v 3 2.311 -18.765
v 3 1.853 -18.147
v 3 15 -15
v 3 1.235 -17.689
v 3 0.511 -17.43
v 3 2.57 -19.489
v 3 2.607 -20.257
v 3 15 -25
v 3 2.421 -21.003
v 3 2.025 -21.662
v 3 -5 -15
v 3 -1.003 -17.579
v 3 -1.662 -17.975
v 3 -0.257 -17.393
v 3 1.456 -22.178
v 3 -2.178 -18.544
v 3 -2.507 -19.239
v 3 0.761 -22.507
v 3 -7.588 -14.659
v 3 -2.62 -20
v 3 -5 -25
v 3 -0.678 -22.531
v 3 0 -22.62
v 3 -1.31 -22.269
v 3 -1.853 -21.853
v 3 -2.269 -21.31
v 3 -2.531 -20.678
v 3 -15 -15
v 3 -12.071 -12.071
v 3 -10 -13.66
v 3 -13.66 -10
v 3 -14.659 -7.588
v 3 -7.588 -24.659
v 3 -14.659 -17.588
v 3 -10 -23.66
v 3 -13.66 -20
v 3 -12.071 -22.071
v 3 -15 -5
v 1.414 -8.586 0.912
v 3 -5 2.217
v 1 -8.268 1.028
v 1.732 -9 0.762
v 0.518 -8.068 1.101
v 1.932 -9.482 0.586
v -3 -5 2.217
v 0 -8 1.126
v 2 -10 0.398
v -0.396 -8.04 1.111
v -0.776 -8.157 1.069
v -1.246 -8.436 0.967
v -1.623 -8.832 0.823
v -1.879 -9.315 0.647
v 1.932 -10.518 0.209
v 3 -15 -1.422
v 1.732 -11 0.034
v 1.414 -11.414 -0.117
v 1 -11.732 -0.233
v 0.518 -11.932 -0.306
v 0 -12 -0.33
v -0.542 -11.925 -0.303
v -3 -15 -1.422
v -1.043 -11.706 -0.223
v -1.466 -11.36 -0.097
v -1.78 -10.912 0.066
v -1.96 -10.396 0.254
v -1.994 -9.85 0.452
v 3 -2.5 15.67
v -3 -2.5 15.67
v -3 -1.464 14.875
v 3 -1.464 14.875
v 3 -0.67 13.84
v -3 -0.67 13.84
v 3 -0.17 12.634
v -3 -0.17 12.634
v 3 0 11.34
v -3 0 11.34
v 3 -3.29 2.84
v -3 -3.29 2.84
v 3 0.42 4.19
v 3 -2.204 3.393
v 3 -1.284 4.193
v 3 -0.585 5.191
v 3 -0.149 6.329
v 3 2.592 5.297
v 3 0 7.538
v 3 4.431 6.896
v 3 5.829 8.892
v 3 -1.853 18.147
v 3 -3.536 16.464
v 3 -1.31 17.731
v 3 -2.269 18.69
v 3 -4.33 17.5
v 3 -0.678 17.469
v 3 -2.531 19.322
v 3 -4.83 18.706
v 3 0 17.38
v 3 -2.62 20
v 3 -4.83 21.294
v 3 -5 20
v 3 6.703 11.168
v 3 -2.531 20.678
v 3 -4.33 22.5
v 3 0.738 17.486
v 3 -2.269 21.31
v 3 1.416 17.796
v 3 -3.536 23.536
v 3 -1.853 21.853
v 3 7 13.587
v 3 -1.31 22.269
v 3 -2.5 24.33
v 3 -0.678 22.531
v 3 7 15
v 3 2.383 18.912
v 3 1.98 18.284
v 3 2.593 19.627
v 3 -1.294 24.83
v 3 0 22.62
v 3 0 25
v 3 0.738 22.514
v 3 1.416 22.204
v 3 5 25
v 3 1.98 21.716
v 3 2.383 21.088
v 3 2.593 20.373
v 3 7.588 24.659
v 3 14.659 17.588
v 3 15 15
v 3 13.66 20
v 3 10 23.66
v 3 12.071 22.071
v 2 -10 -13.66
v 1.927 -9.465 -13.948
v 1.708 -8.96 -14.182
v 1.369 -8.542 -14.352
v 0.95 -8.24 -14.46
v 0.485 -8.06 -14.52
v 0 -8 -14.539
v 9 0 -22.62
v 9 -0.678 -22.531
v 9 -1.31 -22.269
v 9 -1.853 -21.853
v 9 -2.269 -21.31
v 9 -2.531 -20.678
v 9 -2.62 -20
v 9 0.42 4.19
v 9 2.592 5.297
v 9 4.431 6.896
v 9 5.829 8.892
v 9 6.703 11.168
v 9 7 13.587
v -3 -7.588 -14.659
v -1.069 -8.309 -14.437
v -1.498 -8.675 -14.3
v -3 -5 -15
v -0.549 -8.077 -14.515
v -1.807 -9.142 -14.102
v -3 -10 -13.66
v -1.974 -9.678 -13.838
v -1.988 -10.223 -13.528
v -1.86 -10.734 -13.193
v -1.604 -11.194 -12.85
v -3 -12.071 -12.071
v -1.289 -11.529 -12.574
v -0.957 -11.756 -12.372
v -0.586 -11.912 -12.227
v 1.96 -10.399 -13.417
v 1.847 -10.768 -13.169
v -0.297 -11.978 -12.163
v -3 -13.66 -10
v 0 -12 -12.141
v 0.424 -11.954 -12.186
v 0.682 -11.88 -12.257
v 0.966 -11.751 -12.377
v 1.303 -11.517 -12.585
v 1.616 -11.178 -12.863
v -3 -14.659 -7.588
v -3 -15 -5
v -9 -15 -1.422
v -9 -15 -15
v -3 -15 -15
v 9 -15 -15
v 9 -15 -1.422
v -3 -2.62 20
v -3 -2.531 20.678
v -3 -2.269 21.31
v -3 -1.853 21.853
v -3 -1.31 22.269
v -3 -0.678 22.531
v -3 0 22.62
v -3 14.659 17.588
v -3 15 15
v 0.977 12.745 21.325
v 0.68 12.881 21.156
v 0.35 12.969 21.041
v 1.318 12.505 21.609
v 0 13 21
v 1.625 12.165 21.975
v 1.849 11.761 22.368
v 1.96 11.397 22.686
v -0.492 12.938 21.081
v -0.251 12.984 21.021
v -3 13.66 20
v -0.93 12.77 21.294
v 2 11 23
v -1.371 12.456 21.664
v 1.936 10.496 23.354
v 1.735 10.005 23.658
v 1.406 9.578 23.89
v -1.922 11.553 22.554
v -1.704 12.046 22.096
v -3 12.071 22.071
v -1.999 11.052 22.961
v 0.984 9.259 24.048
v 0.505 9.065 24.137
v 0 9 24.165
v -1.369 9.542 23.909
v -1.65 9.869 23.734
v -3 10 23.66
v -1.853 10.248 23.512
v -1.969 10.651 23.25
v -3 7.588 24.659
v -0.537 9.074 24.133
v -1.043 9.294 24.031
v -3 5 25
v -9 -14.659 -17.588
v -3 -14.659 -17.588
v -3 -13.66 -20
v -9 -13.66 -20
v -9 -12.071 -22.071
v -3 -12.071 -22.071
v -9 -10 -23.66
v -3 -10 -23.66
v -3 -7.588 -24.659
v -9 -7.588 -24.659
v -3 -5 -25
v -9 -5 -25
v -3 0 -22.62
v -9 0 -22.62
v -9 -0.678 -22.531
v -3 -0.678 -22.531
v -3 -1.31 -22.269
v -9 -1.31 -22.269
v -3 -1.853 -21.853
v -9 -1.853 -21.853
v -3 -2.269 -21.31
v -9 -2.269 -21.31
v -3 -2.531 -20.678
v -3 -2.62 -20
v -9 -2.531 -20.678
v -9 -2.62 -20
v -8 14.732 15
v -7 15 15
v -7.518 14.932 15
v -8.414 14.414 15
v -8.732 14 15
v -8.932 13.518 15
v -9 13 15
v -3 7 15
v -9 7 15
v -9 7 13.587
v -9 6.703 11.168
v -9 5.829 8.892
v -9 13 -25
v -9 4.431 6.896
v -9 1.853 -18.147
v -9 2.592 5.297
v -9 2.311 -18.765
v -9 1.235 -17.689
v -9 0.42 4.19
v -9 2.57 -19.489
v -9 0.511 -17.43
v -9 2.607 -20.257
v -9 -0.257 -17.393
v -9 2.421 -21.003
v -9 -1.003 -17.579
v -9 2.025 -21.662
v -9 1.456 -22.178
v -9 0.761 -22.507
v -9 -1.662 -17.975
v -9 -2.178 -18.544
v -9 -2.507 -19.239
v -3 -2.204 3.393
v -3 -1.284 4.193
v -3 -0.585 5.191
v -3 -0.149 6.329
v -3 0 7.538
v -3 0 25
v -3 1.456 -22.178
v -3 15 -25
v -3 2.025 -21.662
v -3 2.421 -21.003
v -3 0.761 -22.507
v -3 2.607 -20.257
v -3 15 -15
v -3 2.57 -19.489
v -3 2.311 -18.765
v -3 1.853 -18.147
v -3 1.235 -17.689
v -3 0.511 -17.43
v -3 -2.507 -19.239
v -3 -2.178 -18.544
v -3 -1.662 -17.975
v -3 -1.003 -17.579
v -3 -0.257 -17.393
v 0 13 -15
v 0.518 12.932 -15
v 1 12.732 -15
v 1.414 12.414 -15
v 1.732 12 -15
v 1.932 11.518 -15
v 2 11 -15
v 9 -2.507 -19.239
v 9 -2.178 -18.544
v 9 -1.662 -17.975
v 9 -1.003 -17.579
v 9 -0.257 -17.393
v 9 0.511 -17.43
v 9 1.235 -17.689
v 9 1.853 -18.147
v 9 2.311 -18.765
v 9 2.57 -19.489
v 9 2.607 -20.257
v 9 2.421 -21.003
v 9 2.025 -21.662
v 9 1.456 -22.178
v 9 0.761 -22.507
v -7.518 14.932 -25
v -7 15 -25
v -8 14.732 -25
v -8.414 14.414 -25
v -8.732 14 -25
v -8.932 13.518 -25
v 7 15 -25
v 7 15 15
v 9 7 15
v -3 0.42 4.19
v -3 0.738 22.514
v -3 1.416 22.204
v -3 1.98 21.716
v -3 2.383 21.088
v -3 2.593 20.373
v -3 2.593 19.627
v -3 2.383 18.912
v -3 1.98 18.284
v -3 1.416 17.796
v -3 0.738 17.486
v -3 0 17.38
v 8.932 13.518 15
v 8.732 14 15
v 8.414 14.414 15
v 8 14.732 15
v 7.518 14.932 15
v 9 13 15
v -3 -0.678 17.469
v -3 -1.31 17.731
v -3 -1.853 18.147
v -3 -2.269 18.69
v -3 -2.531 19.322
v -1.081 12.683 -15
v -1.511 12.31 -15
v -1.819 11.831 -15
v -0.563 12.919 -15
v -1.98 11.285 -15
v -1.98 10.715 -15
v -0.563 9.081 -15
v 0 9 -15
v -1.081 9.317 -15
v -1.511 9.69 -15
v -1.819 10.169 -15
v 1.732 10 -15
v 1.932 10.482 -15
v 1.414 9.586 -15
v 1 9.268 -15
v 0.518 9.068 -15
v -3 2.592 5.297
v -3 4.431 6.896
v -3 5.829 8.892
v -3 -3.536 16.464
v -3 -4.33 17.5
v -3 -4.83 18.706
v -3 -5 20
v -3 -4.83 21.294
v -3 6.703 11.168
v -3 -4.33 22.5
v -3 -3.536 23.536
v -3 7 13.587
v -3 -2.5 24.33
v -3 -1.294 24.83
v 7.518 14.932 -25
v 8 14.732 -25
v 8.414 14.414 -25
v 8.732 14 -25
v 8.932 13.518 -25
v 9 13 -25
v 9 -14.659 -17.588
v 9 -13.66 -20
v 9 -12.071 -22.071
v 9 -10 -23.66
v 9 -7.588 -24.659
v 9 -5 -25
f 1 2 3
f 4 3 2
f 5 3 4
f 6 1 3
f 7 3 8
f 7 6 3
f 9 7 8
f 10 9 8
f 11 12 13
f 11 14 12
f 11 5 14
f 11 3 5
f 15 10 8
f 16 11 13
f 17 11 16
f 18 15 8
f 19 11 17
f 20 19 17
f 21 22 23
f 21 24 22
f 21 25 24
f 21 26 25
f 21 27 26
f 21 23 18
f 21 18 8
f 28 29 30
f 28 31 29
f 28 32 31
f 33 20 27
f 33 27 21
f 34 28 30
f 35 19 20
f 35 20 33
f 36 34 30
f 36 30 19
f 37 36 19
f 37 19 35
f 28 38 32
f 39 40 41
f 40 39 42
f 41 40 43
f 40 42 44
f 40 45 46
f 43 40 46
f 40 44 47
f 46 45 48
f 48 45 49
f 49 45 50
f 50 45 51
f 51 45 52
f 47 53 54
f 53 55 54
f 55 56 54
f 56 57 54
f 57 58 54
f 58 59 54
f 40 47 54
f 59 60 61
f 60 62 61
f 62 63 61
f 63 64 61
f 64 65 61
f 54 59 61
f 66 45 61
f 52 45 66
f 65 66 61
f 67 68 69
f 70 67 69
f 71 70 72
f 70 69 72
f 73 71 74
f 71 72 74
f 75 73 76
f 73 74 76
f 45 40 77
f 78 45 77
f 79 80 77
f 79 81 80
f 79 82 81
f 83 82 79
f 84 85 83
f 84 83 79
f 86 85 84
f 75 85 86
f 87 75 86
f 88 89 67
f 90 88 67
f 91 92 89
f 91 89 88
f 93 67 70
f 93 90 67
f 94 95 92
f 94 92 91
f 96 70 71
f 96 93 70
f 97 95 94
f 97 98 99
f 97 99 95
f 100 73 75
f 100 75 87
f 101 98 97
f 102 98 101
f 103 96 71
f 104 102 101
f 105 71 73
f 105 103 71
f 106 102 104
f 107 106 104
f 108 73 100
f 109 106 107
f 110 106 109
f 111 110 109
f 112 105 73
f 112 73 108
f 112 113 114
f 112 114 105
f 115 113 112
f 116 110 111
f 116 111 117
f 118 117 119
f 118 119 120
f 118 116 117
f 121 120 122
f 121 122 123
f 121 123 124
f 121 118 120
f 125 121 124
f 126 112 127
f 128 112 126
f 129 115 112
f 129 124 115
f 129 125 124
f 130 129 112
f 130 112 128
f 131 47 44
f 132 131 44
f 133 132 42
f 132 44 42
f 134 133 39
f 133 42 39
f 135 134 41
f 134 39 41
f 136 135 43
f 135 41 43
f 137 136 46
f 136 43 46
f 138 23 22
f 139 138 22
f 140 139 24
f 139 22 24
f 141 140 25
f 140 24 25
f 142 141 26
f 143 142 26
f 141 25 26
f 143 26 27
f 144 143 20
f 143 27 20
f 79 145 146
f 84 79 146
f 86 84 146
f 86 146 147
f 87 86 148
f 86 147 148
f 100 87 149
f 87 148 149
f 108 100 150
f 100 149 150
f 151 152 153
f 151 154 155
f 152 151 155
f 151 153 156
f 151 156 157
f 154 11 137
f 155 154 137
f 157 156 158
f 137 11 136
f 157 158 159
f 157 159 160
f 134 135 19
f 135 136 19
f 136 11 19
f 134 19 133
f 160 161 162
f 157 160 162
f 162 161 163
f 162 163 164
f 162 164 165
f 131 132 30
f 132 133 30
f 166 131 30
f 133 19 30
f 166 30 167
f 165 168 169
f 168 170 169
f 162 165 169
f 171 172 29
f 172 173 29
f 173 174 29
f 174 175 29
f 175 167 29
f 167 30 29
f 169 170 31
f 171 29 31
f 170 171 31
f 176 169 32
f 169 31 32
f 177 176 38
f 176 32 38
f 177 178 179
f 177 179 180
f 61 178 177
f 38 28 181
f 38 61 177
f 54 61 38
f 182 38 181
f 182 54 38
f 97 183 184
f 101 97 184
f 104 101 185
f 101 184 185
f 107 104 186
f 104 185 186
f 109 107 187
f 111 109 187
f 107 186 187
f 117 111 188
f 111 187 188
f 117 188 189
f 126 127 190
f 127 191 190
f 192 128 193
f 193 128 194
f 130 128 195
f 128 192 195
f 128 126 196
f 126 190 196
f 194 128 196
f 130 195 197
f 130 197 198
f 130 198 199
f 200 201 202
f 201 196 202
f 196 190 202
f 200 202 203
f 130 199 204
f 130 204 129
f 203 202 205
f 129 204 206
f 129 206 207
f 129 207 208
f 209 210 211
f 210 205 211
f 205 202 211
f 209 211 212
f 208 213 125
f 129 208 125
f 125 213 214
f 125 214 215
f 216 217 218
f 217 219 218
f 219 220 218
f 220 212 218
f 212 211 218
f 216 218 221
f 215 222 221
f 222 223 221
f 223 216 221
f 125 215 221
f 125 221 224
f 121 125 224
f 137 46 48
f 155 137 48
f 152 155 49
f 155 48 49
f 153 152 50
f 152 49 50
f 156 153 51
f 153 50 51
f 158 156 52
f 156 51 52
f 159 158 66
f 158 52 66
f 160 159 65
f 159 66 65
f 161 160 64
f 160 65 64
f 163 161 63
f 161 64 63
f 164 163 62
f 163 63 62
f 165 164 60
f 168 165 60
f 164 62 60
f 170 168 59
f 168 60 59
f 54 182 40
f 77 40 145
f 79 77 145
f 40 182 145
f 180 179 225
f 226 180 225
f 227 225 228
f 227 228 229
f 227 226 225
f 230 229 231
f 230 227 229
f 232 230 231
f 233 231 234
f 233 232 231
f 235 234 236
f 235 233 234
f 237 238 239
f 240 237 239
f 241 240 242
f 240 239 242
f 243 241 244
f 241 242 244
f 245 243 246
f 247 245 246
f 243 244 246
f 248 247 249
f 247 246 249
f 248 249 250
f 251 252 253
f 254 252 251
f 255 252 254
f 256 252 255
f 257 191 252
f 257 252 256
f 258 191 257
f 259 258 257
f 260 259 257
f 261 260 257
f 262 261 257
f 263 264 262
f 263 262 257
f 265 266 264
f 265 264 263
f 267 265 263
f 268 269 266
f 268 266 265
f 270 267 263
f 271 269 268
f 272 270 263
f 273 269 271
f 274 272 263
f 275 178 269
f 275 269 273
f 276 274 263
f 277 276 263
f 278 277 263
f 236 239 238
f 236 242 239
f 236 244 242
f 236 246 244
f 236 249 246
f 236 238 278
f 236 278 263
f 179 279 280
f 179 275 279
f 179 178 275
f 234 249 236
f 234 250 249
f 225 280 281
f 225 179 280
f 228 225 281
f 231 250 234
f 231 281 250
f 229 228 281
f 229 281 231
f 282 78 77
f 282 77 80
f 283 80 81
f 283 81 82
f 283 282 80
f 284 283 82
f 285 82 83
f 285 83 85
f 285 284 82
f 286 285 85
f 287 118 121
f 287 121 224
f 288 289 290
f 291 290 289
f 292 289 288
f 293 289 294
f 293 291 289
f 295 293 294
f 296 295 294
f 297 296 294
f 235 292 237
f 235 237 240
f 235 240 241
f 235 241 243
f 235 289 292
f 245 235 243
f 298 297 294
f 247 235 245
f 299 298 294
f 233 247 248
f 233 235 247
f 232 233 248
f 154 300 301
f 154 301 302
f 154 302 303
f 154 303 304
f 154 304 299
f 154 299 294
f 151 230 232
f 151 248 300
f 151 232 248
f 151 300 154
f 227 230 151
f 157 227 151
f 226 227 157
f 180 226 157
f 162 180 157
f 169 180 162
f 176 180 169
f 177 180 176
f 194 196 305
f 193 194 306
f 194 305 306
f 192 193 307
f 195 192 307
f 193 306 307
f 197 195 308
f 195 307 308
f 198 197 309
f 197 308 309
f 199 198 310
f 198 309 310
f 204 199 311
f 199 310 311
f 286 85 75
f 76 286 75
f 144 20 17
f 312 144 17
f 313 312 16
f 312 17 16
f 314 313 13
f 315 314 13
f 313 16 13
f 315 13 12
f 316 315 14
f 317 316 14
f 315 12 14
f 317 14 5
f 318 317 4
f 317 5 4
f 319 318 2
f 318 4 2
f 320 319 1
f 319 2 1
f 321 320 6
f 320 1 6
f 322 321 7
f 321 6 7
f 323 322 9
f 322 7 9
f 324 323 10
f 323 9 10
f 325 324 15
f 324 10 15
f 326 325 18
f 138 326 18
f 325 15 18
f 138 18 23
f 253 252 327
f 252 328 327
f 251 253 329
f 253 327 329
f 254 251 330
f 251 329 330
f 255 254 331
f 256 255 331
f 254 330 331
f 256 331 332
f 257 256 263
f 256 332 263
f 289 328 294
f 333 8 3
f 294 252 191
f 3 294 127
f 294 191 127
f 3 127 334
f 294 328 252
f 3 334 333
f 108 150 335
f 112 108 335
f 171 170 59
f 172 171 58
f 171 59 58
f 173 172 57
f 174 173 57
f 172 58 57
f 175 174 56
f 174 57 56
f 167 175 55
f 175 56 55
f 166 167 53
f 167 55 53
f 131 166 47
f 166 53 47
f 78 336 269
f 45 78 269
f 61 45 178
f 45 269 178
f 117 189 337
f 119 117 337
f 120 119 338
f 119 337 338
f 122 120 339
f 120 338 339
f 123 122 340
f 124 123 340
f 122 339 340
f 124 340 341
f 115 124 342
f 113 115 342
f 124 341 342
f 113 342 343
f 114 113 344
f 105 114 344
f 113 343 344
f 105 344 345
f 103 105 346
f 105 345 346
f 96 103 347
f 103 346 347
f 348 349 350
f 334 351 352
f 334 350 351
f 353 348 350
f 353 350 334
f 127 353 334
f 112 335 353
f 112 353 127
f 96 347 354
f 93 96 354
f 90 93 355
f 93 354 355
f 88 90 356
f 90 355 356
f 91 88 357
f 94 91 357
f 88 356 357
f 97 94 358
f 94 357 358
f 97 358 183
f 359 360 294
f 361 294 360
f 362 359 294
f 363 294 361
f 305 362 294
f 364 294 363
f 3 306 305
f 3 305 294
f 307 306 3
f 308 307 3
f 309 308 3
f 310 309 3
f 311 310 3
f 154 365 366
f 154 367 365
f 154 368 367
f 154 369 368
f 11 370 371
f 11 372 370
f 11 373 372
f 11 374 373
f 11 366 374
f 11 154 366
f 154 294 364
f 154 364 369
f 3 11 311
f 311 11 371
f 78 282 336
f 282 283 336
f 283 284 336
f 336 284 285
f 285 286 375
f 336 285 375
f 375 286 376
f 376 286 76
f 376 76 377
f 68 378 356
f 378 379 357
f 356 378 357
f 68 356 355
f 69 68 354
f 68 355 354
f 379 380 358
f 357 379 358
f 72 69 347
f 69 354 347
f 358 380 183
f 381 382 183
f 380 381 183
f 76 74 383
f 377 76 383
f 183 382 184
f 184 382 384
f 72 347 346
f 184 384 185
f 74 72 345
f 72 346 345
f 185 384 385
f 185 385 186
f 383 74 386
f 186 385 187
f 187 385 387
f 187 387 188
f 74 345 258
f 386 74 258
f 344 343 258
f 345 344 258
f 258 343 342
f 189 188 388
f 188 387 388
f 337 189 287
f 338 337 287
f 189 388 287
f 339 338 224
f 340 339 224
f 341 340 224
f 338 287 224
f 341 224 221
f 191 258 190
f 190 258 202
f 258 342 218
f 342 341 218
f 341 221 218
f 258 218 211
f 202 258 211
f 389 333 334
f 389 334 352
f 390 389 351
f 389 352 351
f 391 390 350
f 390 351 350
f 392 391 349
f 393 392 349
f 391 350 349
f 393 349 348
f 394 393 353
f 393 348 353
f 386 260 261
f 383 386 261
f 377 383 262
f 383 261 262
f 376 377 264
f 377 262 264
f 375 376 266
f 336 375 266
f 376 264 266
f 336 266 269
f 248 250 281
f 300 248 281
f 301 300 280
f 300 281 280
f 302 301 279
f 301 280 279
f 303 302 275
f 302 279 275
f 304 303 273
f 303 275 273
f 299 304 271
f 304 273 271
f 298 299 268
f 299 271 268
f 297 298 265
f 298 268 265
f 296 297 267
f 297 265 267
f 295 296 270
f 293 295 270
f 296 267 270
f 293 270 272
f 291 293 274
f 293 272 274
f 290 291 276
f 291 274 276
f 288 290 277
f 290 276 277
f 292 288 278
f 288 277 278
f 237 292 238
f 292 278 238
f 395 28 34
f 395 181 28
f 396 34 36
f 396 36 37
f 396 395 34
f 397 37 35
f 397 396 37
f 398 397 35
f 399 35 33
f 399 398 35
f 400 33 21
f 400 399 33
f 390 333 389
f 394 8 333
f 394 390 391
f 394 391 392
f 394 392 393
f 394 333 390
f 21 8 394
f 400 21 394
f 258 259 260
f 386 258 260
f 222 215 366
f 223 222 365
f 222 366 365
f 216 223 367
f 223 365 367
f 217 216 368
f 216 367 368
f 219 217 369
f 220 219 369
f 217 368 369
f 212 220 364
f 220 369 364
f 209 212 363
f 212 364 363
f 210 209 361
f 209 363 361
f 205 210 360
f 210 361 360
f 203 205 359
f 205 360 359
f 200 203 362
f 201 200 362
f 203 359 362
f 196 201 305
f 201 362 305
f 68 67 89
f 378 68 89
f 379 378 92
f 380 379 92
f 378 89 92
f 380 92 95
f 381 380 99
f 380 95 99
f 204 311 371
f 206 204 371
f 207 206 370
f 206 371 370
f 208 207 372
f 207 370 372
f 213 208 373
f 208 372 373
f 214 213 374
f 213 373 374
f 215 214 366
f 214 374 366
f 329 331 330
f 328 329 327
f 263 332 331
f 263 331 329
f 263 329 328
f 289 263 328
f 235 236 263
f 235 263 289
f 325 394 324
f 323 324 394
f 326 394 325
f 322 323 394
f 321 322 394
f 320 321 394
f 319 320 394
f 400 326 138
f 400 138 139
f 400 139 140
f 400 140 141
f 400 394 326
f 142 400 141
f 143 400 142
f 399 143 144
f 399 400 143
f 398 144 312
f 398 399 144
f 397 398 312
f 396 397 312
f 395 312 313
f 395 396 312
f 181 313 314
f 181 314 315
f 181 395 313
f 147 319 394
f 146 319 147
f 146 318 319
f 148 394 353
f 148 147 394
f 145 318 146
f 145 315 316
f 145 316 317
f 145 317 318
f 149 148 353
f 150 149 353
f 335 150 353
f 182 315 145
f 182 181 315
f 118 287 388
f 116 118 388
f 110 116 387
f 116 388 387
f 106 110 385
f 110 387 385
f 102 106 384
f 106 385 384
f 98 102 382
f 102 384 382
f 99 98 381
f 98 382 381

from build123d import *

# Parameters (mm, degrees)
F1_DEPTH     = 15
F3_DEPTH     = 6
F5_DEPTH     = 18
F6_R         = 10
F9_DEPTH     = 6
F10_DEPTH    = 6
F11_R        = 2
F13_DEPTH    = 6
F15_R        = 10
F19_DEPTH    = 45.001
F21_DEPTH    = 40.001
F23_DEPTH    = 6
F24_T1_DEPTH = 6


# Not quite as in the source:
# - a fillet or chamfer that OpenCascade refuses, or shapes differently, is made with other operations: its cross-section is extruded or revolved along the edge and cut away or added


with BuildPart() as f1:
    # F0 (on Front) → F1 (new body, symmetric)
    with BuildSketch(Plane.XZ):
        Polygon((9, -15), (9, 15), (3, 15), (3, 25), (-3, 25), (-3, 15), (-9, 15), (-9, -15), (-9, -25), (-3, -25), (-3, -15), (3, -15), (3, -25), (9, -25), align=None)
    extrude(amount=F1_DEPTH, both=True)

    # F2 (on face) → F3 (cut)
    with BuildSketch(Plane(origin=(-3, 0, 0), x_dir=(0, -1, 0), z_dir=(-1, 0, 0))):
        with BuildLine():
            ThreePointArc((0, 22.62), (-2.62, 20), (0, 17.38))
            Line((0, 17.38), (0, 22.62))
        make_face()
        with BuildLine():
            Line((0, 22.62), (0, 17.38))
            ThreePointArc((0, 17.38), (1.8526197667, 18.1473802333), (2.62, 20))
            ThreePointArc((2.62, 20), (1.8526197667, 21.8526197667), (0, 22.62))
        make_face()
    extrude(amount=-F3_DEPTH, mode=Mode.SUBTRACT)

    # F4 (on face) → F5 (cut)
    with BuildSketch(Plane(origin=(-9, 0, 0), x_dir=(0, -1, 0), z_dir=(-1, 0, 0))):
        with BuildLine():
            ThreePointArc((0, -22.62), (1.8526197667, -21.8526197667), (2.62, -20))
            ThreePointArc((2.62, -20), (-1.8526197667, -18.1473802333), (0, -22.62))
        make_face()
    extrude(amount=-F5_DEPTH, mode=Mode.SUBTRACT)

    # F6
    f6_edges = [f1.edges().sort_by_distance(p)[0] for p in [
        (0, 15, 25),
        (0, -15, 25),
        (6, -15, -25),
        (-6, -15, -25),
    ]]
    fillet(f6_edges, radius=F6_R)

    # F8 (on face) → F9 (cut)
    with BuildSketch(Plane(origin=(-9, 0, 0), x_dir=(0, -1, 0), z_dir=(-1, 0, 0))):
        with BuildLine():
            ThreePointArc((-7, 13.5872004348), (-5.1915204429, 7.8514360713), (-0.4202014333, 4.190274227))
            Line((-0.4202014333, 4.190274227), (15, -1.4222201011))
            Line((15, -1.4222201011), (15, 15))
            Line((15, 15), (-7, 15))
            Line((-7, 15), (-7, 13.5872004348))
        make_face()
    extrude(amount=-F9_DEPTH, mode=Mode.SUBTRACT)

    # F7 (on face) → F10 (cut)
    with BuildSketch(Plane.YZ.offset(9)):
        with BuildLine():
            Line((7, 15), (-15, 15))
            Line((-15, 15), (-15, -1.42222))
            Line((-15, -1.42222), (0.4202014333, 4.1902743281))
            ThreePointArc((0.4202014333, 4.1902743281), (5.1915204429, 7.8514361724), (7, 13.587200536))
            Line((7, 13.587200536), (7, 15))
        make_face()
    extrude(amount=-F10_DEPTH, mode=Mode.SUBTRACT)

    # F11
    f11_edges = [f1.edges().sort_by_distance(p)[0] for p in [
        (9, 15, -5),
        (-9, 15, -5),
    ]]
    fillet(f11_edges, radius=F11_R)

    # F12 (on face) → F13 (cut)
    with BuildSketch(Plane(origin=(-3, 0, 0), x_dir=(0, -1, 0), z_dir=(-1, 0, 0))):
        with BuildLine():
            Line((5, 25), (0, 25))
            ThreePointArc((0, 25), (3.5355339059, 23.5355339059), (5, 20))
            Line((5, 20), (5, 2.2174822415))
            Line((5, 2.2174822415), (15, -1.4222201011))
            Line((15, -1.4222201011), (15, 15))
            ThreePointArc((15, 15), (12.0710678119, 22.0710678119), (5, 25))
        make_face()
    extrude(amount=-F13_DEPTH, mode=Mode.SUBTRACT)

    # F15
    f15_edges = [f1.edges().sort_by_distance(p)[0] for p in [
        (0, -15, -15),
    ]]
    fillet(f15_edges, radius=F15_R)

    # F18 (on face) → F19 (cut, through all)
    with BuildSketch(Plane.XY.offset(20)):
        with BuildLine():
            ThreePointArc((2, -10), (1.4142135624, -8.5857864376), (0, -8))
            Line((0, -8), (0, -12))
            ThreePointArc((0, -12), (1.4142135624, -11.4142135624), (2, -10))
        make_face()
        with BuildLine():
            Line((0, -12), (0, -8))
            ThreePointArc((0, -8), (-2, -10), (0, -12))
        make_face()
    extrude(amount=-F19_DEPTH, mode=Mode.SUBTRACT)

    # F20 (on face) → F21 (cut, through all)
    with BuildSketch(Plane(origin=(0, 0, -15), x_dir=(1, 0, 0), z_dir=(0, 0, -1))):
        with BuildLine():
            ThreePointArc((0, -9), (-2, -11), (0, -13))
            Line((0, -13), (0, -11))
            Line((0, -11), (0, -9))
        make_face()
        with BuildLine():
            Line((0, -11), (0, -13))
            ThreePointArc((0, -13), (1.4142135624, -12.4142135624), (2, -11))
            ThreePointArc((2, -11), (1.4142135624, -9.5857864376), (0, -9))
            Line((0, -9), (0, -11))
        make_face()
    extrude(amount=-F21_DEPTH, mode=Mode.SUBTRACT)

    # F22 (on face) → F23 (cut)
    with BuildSketch(Plane.YZ.offset(3)):
        with BuildLine():
            ThreePointArc((0, 15), (-3.5355339059, 16.4644660941), (-5, 20))
            Line((-5, 20), (-5, 2.2174822415))
            Line((-5.0000000325, 2.2174823308), (0, 4.037333514))
            Line((0, 4.037333514), (0, 15))
        make_face()
    extrude(amount=-F23_DEPTH, mode=Mode.SUBTRACT)

    # F24: fillet of radius 5 on 2 edges, made by hand

    # F24_s2 → F24_t1 (join)
    with BuildSketch(Plane.YZ.offset(-3)):
        with BuildLine():
            ThreePointArc((-2.5, 15.6698729811), (-0.6698729811, 13.8397459622), (0, 11.3397459622))
            Line((0, 11.3397459622), (0, 15))
            ThreePointArc((0, 15), (-1.2940952255, 15.1703708686), (-2.5, 15.6698729811))
        make_face()
        with BuildLine():
            ThreePointArc((-3.2898992834, 2.8399081011), (-0.9042397786, 4.6704890233), (0, 7.538371205))
            Line((0, 7.538371205), (0, 4.037333514))
            Line((0, 4.037333514), (-3.2898992834, 2.8399081011))
        make_face()
    extrude(amount=F24_T1_DEPTH)


solid = f1.part
